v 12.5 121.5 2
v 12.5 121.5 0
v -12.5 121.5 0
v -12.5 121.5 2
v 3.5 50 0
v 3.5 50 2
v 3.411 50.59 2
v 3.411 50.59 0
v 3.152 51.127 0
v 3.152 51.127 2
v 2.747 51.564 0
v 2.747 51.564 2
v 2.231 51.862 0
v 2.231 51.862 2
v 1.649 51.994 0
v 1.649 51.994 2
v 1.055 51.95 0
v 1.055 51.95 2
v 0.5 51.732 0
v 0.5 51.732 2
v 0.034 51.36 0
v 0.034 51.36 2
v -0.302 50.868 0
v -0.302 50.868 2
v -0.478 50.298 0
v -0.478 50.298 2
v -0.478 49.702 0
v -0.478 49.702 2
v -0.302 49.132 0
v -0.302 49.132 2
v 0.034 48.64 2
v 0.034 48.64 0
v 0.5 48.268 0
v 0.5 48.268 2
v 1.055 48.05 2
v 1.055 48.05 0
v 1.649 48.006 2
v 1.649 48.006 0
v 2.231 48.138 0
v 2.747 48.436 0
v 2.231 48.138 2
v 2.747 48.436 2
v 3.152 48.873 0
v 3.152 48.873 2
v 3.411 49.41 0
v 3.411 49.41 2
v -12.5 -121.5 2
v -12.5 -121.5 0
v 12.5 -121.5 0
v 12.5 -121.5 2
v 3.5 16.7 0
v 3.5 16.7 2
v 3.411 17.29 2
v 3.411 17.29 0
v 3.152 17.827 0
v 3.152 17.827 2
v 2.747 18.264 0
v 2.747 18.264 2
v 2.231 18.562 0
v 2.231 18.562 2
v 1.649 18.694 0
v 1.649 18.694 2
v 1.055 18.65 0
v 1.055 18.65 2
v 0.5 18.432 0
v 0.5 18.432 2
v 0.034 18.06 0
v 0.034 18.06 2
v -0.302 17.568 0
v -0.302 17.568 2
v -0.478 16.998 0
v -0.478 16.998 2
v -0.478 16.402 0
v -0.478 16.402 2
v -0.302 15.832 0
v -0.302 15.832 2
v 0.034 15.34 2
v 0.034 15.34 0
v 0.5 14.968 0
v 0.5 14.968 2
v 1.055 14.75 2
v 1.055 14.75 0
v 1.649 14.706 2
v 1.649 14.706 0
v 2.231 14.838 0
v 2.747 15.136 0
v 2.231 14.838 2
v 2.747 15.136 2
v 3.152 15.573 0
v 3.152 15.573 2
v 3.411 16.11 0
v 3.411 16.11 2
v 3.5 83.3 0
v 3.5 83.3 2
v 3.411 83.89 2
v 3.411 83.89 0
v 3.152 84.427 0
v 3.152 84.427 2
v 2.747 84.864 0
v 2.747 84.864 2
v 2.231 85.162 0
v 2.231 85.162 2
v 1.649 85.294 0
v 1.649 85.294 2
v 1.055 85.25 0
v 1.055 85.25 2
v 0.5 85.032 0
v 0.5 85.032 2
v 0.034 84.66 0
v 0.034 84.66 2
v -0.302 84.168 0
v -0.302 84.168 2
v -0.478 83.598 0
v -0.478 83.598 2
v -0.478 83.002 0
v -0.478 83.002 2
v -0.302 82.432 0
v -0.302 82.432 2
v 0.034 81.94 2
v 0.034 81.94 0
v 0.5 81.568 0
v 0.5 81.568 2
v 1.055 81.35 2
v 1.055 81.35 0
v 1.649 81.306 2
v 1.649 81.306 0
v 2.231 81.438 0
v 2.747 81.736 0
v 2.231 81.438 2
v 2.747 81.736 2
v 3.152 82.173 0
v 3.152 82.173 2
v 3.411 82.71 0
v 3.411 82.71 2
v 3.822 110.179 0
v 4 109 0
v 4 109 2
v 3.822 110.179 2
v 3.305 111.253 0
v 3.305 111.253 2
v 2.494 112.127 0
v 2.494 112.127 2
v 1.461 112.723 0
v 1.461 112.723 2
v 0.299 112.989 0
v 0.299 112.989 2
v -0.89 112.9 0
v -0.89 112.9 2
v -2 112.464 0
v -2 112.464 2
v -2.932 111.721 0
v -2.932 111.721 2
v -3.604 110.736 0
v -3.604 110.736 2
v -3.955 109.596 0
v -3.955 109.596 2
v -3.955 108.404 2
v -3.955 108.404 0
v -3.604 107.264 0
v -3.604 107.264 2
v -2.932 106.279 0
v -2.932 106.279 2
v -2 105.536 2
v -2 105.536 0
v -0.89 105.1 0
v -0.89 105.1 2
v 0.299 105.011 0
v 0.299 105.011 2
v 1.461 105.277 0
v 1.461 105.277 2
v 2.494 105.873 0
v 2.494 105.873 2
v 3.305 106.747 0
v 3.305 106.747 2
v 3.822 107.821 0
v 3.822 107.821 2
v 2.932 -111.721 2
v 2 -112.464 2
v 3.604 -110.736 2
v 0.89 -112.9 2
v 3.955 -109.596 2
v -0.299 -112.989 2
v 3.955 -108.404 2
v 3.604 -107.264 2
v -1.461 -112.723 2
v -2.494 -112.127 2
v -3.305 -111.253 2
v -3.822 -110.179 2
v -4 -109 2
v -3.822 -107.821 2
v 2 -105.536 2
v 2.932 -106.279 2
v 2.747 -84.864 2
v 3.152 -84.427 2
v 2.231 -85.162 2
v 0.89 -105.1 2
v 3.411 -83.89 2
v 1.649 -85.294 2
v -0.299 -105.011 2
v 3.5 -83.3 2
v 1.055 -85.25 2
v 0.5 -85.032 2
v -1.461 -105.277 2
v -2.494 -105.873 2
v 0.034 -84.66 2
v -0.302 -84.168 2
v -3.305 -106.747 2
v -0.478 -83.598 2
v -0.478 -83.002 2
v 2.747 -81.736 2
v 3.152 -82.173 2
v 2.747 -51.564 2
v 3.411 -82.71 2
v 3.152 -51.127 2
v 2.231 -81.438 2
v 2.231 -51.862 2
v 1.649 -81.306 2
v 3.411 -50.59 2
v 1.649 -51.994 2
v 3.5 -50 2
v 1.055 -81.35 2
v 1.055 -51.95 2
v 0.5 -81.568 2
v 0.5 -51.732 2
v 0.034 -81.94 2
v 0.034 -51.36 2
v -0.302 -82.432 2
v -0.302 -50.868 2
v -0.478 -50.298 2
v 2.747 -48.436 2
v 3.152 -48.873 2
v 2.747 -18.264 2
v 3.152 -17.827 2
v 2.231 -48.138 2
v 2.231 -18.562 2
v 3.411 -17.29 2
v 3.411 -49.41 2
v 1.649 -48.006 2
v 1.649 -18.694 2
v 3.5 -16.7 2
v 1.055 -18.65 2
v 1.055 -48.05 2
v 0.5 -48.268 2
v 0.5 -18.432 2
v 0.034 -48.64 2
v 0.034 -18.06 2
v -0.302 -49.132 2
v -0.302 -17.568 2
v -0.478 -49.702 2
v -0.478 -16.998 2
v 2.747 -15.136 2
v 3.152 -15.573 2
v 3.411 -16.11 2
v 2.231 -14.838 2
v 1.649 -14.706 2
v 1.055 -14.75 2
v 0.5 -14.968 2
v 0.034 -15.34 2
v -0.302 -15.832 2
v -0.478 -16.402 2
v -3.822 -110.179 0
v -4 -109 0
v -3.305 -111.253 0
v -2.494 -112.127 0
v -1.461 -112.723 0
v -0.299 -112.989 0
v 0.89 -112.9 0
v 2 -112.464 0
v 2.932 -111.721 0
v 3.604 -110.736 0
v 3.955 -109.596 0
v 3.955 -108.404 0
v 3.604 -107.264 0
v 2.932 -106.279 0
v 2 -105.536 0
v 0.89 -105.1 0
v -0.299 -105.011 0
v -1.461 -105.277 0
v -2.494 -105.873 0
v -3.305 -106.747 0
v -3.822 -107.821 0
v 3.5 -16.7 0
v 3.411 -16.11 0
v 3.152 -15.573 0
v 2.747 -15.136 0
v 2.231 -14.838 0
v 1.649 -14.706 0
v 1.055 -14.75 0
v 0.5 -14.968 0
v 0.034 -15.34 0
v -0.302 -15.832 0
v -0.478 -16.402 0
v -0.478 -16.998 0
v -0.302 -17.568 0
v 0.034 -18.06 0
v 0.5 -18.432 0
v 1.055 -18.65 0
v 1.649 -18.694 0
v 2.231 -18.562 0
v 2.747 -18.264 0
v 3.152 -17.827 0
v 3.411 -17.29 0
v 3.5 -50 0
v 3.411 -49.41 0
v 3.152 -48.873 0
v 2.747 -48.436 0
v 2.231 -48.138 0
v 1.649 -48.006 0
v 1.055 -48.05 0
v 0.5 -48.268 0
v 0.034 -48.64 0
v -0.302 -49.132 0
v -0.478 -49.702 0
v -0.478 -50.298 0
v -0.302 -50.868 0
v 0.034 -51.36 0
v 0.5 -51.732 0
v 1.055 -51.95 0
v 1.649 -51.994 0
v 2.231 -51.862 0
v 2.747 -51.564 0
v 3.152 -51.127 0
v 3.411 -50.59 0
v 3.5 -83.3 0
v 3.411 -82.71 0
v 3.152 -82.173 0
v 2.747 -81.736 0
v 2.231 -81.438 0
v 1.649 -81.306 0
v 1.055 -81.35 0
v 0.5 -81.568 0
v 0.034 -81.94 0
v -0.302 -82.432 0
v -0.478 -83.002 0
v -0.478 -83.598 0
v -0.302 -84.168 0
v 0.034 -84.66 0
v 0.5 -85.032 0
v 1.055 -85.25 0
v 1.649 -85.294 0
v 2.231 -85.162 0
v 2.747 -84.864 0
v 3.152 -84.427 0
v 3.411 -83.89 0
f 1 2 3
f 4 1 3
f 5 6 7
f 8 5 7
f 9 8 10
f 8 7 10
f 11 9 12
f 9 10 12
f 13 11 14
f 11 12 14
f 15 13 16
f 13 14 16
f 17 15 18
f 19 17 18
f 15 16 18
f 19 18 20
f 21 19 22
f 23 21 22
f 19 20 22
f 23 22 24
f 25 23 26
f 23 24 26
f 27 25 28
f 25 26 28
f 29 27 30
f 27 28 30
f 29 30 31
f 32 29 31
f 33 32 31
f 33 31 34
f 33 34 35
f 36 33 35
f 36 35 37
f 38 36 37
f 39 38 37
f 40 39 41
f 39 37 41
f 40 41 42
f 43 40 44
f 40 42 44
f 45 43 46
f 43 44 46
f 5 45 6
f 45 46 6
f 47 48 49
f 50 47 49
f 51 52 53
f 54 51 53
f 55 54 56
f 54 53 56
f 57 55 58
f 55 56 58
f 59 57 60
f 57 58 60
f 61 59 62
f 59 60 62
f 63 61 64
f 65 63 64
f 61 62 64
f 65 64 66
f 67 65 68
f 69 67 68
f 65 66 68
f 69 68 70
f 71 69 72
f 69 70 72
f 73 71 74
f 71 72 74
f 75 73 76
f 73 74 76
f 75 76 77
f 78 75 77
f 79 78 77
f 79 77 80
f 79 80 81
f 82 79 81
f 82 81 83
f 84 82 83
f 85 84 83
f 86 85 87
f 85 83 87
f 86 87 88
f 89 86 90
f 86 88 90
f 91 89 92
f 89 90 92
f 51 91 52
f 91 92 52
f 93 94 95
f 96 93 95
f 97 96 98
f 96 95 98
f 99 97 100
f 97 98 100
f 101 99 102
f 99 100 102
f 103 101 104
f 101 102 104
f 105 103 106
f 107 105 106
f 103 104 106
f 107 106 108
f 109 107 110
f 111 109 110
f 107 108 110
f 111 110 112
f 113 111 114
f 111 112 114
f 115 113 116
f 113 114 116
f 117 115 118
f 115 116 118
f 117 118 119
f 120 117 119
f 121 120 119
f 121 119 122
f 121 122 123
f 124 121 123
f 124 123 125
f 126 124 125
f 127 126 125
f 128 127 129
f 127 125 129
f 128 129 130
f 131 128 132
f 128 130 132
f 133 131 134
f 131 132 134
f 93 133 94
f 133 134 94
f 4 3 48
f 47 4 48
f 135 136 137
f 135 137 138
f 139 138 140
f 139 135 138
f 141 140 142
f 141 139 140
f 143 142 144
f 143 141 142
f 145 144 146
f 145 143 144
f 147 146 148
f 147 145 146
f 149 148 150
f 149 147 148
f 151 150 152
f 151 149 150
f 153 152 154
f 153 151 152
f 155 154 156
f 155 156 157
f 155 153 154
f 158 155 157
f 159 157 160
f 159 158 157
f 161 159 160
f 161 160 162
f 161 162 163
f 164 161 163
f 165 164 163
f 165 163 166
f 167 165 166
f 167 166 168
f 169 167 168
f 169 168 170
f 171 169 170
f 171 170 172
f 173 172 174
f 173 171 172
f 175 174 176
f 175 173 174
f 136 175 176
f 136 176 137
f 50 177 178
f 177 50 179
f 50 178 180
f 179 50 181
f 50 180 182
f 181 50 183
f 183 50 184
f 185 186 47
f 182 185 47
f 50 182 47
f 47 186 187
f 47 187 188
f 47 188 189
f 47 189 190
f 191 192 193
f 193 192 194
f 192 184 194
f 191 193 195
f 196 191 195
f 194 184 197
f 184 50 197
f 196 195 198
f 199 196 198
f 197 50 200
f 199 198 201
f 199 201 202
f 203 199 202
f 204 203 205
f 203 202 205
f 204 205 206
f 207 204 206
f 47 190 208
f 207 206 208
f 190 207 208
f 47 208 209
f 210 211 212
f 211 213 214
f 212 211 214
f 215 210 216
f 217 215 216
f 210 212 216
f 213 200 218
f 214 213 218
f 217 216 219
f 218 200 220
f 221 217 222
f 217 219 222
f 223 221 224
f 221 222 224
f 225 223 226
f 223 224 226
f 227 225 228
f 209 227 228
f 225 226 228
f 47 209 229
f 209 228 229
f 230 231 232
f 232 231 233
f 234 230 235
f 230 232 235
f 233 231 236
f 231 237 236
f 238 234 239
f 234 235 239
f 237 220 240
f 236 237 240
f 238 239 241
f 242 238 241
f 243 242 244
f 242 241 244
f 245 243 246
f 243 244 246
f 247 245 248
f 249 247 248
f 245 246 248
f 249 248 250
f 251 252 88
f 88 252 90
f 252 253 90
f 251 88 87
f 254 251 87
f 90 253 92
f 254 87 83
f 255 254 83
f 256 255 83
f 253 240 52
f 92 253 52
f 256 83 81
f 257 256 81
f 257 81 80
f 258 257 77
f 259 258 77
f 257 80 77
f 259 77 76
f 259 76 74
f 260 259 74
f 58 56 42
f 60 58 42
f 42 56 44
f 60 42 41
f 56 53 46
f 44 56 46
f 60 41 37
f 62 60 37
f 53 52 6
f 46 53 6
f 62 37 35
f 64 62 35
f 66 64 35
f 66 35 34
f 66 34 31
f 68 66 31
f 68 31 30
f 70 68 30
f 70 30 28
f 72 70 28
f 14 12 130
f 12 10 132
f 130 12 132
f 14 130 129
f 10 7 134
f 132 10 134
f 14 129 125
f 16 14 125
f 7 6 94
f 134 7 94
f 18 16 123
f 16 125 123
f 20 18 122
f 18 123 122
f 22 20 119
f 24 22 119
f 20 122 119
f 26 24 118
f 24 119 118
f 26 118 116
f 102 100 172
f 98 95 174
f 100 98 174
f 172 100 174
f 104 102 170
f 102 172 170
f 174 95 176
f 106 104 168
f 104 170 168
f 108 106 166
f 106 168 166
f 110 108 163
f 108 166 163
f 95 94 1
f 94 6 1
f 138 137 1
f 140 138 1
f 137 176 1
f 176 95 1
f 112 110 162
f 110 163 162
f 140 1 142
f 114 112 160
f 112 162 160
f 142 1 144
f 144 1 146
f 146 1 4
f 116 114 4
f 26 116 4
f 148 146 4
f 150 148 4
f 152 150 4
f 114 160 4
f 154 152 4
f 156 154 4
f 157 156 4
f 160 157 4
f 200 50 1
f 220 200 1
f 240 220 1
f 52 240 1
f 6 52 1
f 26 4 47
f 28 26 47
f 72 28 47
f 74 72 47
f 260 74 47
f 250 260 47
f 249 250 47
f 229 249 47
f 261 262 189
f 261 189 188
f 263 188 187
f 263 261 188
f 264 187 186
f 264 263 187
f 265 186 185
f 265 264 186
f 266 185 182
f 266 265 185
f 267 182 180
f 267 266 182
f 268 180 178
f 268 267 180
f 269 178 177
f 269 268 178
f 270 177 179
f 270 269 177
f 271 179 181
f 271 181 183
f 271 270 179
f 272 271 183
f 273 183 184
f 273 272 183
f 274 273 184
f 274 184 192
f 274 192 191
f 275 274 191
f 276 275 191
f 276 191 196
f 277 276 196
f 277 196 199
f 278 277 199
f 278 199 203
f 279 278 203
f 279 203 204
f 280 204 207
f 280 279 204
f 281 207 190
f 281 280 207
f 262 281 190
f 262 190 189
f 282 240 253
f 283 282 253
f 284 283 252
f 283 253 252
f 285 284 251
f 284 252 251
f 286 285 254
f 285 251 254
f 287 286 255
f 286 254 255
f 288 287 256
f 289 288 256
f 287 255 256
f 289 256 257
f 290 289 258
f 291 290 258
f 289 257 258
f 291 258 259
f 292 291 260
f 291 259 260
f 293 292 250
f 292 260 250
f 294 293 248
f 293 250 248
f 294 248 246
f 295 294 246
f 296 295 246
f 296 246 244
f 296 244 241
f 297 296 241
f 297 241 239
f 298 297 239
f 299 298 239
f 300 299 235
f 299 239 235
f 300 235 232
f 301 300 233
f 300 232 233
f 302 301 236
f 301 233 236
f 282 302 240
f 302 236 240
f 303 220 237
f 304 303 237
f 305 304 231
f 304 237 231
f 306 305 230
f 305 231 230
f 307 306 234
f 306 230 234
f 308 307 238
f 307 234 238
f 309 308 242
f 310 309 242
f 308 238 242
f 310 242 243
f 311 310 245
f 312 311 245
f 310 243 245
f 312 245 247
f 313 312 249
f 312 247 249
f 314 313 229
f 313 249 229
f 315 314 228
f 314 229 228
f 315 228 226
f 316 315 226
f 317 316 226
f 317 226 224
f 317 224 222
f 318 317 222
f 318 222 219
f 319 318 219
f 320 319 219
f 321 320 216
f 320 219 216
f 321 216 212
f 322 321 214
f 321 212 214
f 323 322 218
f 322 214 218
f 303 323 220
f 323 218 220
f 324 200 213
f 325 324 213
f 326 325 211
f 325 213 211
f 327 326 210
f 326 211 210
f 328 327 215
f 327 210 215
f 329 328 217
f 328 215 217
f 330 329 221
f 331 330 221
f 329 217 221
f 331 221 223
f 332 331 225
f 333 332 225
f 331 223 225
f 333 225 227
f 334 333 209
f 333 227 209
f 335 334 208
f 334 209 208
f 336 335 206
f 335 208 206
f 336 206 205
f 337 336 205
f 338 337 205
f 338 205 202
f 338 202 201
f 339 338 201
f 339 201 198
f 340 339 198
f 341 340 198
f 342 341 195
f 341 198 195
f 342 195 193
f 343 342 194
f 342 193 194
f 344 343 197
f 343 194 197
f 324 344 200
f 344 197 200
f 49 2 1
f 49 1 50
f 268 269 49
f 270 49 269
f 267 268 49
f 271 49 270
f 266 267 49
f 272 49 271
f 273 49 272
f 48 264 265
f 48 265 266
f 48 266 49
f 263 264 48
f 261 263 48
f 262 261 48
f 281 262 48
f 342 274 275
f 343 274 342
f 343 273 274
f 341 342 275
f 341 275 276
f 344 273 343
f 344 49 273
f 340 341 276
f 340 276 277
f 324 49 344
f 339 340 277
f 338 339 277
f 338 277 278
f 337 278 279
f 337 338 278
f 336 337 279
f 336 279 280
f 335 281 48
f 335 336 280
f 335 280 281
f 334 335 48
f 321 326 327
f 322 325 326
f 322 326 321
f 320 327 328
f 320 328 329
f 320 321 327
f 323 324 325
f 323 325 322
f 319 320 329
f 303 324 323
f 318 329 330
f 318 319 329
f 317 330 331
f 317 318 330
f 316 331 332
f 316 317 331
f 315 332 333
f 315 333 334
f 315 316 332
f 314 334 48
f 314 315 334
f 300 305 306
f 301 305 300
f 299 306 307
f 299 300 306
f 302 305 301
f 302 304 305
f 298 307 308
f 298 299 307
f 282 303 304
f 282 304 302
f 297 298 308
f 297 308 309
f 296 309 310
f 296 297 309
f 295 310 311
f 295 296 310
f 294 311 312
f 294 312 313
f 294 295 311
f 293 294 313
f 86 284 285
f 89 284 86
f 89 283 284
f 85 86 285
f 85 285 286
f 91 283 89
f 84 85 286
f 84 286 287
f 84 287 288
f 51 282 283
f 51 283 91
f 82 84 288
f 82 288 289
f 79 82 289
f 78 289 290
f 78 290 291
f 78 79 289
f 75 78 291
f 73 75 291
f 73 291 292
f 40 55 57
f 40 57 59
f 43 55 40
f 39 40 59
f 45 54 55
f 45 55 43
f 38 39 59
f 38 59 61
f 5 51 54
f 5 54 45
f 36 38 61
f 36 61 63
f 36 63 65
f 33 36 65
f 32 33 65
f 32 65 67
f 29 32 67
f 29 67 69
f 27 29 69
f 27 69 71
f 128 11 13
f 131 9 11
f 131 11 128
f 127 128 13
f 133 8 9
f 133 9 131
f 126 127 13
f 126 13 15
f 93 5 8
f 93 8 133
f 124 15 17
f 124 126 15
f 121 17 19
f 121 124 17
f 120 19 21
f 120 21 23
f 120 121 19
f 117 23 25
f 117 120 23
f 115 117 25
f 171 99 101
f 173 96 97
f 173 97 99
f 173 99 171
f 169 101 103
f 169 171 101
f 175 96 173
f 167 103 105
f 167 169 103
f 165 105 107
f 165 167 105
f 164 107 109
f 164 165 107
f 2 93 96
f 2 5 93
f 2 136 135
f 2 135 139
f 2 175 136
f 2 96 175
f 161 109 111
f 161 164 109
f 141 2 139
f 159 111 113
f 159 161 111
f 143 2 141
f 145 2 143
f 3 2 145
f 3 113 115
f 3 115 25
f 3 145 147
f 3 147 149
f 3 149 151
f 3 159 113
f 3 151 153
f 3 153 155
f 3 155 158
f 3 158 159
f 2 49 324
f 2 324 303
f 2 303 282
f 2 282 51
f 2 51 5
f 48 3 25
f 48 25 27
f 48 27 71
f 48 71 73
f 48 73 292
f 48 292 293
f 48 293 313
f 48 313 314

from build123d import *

# Parameters (mm, degrees)
SKETCH1_R           = 4
BOSS_EXTRUDE1_DEPTH = 2
SKETCH2_R           = 2
CUT_EXTRUDE1_DEPTH  = 2


with BuildPart() as part:
    # Sketch1 → Boss-Extrude1 (new body)
    with BuildSketch(Plane.XY):
        Polygon((3.5, 121.5), (12.5, 121.5), (12.5, -121.5), (3.5, -121.5), (0, -121.5), (-12.5, -121.5), (-12.5, -115.487492178), (-12.5, -105.5), (-12.5, 112.5), (-12.5, 121.5), align=None)
        with Locations((0, 109)):
            Circle(SKETCH1_R, mode=Mode.SUBTRACT)
        with Locations(Location((0, -109, 0), (0, 0, 180))):
            Circle(SKETCH1_R, mode=Mode.SUBTRACT)
    extrude(amount=BOSS_EXTRUDE1_DEPTH)

    # Sketch2 → Cut-Extrude1 (cut)
    with BuildSketch(Plane.XY.offset(2)):
        with Locations((1.5, 83.3)):
            Circle(SKETCH2_R)
        with Locations((1.5, 50)):
            Circle(SKETCH2_R)
        with Locations((1.5, 16.7)):
            Circle(SKETCH2_R)
        with Locations((1.5, -16.7)):
            Circle(SKETCH2_R)
        with Locations((1.5, -50)):
            Circle(SKETCH2_R)
        with Locations((1.5, -83.3)):
            Circle(SKETCH2_R)
    extrude(amount=-CUT_EXTRUDE1_DEPTH, mode=Mode.SUBTRACT)


solid = part.part
